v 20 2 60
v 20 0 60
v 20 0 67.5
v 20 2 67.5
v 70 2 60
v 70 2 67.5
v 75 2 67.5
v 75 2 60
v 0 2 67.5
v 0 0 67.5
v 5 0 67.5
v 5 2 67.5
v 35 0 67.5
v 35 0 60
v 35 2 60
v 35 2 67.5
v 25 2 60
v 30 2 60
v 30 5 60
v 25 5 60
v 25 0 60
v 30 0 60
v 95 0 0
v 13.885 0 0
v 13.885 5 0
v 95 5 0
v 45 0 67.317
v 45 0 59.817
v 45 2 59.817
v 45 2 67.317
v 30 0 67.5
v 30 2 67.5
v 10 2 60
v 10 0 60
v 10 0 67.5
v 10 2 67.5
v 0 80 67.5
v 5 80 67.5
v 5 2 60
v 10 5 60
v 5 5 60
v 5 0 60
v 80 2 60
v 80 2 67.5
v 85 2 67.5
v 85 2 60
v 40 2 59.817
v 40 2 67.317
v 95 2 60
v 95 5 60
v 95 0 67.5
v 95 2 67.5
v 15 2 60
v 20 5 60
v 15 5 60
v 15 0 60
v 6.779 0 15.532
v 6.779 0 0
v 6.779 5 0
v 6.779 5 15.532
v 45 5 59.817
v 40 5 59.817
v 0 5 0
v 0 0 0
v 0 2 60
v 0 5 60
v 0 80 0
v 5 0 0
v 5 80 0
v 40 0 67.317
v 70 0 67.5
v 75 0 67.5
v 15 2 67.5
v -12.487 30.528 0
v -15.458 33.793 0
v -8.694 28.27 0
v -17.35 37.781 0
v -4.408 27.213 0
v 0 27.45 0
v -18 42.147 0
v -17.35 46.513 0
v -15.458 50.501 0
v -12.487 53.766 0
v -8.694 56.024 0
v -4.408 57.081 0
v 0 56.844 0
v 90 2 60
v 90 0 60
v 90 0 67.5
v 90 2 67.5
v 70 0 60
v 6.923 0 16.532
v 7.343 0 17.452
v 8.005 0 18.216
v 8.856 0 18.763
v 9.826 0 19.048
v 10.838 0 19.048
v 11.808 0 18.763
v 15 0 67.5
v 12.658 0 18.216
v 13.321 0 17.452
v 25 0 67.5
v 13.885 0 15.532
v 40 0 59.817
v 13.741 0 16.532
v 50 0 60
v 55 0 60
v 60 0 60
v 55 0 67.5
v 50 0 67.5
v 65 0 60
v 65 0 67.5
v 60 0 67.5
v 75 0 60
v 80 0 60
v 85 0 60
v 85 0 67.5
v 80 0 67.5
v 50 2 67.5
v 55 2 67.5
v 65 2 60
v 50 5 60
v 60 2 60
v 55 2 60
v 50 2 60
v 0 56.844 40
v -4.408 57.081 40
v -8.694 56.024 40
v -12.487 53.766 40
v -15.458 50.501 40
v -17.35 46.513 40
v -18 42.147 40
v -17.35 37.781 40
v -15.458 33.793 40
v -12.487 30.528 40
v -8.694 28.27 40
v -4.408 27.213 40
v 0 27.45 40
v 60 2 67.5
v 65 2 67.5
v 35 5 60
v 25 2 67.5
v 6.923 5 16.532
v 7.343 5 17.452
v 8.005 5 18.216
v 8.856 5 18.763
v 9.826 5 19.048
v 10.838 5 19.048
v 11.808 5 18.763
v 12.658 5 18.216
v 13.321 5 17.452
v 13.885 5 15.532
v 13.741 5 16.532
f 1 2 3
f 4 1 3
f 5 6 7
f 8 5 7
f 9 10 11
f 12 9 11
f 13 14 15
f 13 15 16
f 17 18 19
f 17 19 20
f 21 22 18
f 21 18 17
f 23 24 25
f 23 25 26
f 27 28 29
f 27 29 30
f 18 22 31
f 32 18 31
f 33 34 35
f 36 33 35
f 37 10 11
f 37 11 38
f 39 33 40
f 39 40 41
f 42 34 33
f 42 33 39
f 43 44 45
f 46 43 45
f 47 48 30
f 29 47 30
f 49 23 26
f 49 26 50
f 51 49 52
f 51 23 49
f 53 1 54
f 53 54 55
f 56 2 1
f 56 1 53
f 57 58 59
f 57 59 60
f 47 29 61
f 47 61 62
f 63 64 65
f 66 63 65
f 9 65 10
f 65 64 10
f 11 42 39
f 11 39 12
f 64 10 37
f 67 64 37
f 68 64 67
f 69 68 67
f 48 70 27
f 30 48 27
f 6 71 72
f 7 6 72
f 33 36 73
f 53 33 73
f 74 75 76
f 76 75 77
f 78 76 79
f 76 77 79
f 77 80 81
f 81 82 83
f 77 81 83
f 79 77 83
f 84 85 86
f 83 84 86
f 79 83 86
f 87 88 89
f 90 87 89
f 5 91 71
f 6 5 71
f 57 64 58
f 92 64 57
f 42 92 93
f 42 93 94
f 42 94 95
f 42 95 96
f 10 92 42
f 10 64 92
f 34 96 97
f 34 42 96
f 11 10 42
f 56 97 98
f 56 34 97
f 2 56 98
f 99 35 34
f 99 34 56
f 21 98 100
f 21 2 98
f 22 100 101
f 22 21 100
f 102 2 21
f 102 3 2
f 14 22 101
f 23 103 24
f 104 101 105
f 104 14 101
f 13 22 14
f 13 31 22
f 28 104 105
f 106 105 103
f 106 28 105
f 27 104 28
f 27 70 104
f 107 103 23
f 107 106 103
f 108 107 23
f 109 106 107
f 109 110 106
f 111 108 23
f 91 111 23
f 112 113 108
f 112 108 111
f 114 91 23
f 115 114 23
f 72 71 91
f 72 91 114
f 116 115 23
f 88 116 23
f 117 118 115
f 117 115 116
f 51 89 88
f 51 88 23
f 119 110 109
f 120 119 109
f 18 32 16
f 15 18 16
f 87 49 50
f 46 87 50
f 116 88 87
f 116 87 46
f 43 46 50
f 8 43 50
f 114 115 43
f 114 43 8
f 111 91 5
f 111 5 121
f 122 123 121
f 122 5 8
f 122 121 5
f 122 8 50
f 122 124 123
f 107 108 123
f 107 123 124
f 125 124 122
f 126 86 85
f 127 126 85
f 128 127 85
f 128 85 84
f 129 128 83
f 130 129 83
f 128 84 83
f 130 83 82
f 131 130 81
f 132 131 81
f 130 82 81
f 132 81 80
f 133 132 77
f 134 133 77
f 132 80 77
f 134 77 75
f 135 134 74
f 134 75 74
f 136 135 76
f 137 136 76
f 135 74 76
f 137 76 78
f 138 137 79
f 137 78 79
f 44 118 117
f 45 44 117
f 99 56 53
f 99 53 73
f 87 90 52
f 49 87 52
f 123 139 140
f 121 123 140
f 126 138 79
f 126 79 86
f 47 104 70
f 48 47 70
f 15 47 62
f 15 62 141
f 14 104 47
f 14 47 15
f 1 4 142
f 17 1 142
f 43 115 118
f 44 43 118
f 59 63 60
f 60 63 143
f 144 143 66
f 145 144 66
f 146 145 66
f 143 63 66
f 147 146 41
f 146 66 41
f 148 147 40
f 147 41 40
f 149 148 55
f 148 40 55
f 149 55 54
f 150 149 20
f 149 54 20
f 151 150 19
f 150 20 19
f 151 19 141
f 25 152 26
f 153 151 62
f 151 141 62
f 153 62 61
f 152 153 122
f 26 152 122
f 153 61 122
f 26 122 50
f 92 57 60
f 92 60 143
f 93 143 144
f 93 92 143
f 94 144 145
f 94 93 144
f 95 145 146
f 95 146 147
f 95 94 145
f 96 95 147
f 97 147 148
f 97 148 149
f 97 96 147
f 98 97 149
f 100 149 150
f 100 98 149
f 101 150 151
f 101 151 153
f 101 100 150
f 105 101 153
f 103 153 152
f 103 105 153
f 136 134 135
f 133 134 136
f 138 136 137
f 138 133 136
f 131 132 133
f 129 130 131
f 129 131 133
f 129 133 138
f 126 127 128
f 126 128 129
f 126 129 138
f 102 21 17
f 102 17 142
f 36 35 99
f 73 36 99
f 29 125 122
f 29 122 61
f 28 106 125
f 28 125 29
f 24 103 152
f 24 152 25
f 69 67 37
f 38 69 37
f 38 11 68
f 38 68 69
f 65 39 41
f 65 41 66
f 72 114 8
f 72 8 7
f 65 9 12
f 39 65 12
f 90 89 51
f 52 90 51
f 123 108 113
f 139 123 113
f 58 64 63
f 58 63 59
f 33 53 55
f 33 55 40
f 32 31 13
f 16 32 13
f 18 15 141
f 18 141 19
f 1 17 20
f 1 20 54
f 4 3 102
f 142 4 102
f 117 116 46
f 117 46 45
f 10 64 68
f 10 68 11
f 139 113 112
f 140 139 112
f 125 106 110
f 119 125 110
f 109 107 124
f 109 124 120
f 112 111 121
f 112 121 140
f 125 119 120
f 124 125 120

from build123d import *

# Parameters (mm, degrees)
F3_DEPTH = 40
F4_DEPTH = 5
F0_W     = 5
F0_H     = 7.5
F5_DEPTH = 2
F1_W     = 80
F1_H     = 67.5
F6_DEPTH = 5


with BuildPart() as f3:
    # F2 (on Top) → F3 (new body)
    with BuildSketch(Plane.XY):
        with BuildLine():
            Line((0, 27.450039), (0, 56.843915))
            ThreePointArc((0, 56.843915), (-18, 42.146977), (0, 27.450039))
        make_face()
    extrude(amount=F3_DEPTH)


with BuildPart() as f4:
    # F0 (on Front) → F4 (new body)
    with BuildSketch(Plane.XZ):
        with BuildLine():
            Line((0, 60), (0, 0))
            Line((0, 0), (6.779334, 0))
            Line((6.779334, 0), (6.779334, 15.531576))
            ThreePointArc((6.779334, 15.531576), (10.331965, 19.084208), (13.884597, 15.531576))
            Line((13.884597, 15.531576), (13.884597, 0))
            Line((13.884597, 0), (95, 0))
            Line((95, 0), (95, 60))
            Line((95, 60), (90, 60))
            Line((90, 60), (85, 60))
            Line((85, 60), (80, 60))
            Line((80, 60), (75, 60))
            Line((75, 60), (70, 60))
            Line((70, 60), (65, 60))
            Line((65, 60), (60, 60))
            Line((60, 60), (55, 60))
            Line((55, 60), (50, 60))
            Line((50, 60), (45, 59.817482))
            Line((45, 59.817482), (40, 59.817482))
            Line((40, 59.817482), (35, 59.999999))
            Line((35, 59.999999), (30, 59.999999))
            Line((30, 59.999999), (25, 60))
            Line((25, 60), (20, 60))
            Line((20, 60), (15, 59.999999))
            Line((15, 59.999999), (10, 59.999999))
            Line((10, 59.999999), (5, 60))
            Line((5, 60), (0, 60))
        make_face()
    extrude(amount=-F4_DEPTH)

    # F0 (on Front) → F5 (join)
    with BuildSketch(Plane.XZ):
        with Locations((2.5, 63.75)):
            Rectangle(F0_W, F0_H)
        with Locations((12.5, 63.749999)):
            Rectangle(F0_W, F0_H)
        with Locations((22.5, 63.75)):
            Rectangle(F0_W, F0_H)
        with Locations((32.5, 63.749999)):
            Rectangle(F0_W, F0_H)
        with Locations((42.5, 63.567482)):
            Rectangle(F0_W, F0_H)
        with Locations((52.5, 63.75)):
            Rectangle(F0_W, F0_H)
        with Locations((62.5, 63.75)):
            Rectangle(F0_W, F0_H)
        with Locations((72.5, 63.75)):
            Rectangle(F0_W, F0_H)
        with Locations((82.5, 63.75)):
            Rectangle(F0_W, F0_H)
        with Locations((92.5, 63.75)):
            Rectangle(F0_W, F0_H)
    extrude(amount=-F5_DEPTH)


with BuildPart() as f6:
    # F1 (on Right) → F6 (new body)
    with BuildSketch(Plane.YZ):
        with Locations((40, 33.75)):
            Rectangle(F1_W, F1_H)
    extrude(amount=F6_DEPTH)


solid = Compound([f3.part, f4.part, f6.part])
